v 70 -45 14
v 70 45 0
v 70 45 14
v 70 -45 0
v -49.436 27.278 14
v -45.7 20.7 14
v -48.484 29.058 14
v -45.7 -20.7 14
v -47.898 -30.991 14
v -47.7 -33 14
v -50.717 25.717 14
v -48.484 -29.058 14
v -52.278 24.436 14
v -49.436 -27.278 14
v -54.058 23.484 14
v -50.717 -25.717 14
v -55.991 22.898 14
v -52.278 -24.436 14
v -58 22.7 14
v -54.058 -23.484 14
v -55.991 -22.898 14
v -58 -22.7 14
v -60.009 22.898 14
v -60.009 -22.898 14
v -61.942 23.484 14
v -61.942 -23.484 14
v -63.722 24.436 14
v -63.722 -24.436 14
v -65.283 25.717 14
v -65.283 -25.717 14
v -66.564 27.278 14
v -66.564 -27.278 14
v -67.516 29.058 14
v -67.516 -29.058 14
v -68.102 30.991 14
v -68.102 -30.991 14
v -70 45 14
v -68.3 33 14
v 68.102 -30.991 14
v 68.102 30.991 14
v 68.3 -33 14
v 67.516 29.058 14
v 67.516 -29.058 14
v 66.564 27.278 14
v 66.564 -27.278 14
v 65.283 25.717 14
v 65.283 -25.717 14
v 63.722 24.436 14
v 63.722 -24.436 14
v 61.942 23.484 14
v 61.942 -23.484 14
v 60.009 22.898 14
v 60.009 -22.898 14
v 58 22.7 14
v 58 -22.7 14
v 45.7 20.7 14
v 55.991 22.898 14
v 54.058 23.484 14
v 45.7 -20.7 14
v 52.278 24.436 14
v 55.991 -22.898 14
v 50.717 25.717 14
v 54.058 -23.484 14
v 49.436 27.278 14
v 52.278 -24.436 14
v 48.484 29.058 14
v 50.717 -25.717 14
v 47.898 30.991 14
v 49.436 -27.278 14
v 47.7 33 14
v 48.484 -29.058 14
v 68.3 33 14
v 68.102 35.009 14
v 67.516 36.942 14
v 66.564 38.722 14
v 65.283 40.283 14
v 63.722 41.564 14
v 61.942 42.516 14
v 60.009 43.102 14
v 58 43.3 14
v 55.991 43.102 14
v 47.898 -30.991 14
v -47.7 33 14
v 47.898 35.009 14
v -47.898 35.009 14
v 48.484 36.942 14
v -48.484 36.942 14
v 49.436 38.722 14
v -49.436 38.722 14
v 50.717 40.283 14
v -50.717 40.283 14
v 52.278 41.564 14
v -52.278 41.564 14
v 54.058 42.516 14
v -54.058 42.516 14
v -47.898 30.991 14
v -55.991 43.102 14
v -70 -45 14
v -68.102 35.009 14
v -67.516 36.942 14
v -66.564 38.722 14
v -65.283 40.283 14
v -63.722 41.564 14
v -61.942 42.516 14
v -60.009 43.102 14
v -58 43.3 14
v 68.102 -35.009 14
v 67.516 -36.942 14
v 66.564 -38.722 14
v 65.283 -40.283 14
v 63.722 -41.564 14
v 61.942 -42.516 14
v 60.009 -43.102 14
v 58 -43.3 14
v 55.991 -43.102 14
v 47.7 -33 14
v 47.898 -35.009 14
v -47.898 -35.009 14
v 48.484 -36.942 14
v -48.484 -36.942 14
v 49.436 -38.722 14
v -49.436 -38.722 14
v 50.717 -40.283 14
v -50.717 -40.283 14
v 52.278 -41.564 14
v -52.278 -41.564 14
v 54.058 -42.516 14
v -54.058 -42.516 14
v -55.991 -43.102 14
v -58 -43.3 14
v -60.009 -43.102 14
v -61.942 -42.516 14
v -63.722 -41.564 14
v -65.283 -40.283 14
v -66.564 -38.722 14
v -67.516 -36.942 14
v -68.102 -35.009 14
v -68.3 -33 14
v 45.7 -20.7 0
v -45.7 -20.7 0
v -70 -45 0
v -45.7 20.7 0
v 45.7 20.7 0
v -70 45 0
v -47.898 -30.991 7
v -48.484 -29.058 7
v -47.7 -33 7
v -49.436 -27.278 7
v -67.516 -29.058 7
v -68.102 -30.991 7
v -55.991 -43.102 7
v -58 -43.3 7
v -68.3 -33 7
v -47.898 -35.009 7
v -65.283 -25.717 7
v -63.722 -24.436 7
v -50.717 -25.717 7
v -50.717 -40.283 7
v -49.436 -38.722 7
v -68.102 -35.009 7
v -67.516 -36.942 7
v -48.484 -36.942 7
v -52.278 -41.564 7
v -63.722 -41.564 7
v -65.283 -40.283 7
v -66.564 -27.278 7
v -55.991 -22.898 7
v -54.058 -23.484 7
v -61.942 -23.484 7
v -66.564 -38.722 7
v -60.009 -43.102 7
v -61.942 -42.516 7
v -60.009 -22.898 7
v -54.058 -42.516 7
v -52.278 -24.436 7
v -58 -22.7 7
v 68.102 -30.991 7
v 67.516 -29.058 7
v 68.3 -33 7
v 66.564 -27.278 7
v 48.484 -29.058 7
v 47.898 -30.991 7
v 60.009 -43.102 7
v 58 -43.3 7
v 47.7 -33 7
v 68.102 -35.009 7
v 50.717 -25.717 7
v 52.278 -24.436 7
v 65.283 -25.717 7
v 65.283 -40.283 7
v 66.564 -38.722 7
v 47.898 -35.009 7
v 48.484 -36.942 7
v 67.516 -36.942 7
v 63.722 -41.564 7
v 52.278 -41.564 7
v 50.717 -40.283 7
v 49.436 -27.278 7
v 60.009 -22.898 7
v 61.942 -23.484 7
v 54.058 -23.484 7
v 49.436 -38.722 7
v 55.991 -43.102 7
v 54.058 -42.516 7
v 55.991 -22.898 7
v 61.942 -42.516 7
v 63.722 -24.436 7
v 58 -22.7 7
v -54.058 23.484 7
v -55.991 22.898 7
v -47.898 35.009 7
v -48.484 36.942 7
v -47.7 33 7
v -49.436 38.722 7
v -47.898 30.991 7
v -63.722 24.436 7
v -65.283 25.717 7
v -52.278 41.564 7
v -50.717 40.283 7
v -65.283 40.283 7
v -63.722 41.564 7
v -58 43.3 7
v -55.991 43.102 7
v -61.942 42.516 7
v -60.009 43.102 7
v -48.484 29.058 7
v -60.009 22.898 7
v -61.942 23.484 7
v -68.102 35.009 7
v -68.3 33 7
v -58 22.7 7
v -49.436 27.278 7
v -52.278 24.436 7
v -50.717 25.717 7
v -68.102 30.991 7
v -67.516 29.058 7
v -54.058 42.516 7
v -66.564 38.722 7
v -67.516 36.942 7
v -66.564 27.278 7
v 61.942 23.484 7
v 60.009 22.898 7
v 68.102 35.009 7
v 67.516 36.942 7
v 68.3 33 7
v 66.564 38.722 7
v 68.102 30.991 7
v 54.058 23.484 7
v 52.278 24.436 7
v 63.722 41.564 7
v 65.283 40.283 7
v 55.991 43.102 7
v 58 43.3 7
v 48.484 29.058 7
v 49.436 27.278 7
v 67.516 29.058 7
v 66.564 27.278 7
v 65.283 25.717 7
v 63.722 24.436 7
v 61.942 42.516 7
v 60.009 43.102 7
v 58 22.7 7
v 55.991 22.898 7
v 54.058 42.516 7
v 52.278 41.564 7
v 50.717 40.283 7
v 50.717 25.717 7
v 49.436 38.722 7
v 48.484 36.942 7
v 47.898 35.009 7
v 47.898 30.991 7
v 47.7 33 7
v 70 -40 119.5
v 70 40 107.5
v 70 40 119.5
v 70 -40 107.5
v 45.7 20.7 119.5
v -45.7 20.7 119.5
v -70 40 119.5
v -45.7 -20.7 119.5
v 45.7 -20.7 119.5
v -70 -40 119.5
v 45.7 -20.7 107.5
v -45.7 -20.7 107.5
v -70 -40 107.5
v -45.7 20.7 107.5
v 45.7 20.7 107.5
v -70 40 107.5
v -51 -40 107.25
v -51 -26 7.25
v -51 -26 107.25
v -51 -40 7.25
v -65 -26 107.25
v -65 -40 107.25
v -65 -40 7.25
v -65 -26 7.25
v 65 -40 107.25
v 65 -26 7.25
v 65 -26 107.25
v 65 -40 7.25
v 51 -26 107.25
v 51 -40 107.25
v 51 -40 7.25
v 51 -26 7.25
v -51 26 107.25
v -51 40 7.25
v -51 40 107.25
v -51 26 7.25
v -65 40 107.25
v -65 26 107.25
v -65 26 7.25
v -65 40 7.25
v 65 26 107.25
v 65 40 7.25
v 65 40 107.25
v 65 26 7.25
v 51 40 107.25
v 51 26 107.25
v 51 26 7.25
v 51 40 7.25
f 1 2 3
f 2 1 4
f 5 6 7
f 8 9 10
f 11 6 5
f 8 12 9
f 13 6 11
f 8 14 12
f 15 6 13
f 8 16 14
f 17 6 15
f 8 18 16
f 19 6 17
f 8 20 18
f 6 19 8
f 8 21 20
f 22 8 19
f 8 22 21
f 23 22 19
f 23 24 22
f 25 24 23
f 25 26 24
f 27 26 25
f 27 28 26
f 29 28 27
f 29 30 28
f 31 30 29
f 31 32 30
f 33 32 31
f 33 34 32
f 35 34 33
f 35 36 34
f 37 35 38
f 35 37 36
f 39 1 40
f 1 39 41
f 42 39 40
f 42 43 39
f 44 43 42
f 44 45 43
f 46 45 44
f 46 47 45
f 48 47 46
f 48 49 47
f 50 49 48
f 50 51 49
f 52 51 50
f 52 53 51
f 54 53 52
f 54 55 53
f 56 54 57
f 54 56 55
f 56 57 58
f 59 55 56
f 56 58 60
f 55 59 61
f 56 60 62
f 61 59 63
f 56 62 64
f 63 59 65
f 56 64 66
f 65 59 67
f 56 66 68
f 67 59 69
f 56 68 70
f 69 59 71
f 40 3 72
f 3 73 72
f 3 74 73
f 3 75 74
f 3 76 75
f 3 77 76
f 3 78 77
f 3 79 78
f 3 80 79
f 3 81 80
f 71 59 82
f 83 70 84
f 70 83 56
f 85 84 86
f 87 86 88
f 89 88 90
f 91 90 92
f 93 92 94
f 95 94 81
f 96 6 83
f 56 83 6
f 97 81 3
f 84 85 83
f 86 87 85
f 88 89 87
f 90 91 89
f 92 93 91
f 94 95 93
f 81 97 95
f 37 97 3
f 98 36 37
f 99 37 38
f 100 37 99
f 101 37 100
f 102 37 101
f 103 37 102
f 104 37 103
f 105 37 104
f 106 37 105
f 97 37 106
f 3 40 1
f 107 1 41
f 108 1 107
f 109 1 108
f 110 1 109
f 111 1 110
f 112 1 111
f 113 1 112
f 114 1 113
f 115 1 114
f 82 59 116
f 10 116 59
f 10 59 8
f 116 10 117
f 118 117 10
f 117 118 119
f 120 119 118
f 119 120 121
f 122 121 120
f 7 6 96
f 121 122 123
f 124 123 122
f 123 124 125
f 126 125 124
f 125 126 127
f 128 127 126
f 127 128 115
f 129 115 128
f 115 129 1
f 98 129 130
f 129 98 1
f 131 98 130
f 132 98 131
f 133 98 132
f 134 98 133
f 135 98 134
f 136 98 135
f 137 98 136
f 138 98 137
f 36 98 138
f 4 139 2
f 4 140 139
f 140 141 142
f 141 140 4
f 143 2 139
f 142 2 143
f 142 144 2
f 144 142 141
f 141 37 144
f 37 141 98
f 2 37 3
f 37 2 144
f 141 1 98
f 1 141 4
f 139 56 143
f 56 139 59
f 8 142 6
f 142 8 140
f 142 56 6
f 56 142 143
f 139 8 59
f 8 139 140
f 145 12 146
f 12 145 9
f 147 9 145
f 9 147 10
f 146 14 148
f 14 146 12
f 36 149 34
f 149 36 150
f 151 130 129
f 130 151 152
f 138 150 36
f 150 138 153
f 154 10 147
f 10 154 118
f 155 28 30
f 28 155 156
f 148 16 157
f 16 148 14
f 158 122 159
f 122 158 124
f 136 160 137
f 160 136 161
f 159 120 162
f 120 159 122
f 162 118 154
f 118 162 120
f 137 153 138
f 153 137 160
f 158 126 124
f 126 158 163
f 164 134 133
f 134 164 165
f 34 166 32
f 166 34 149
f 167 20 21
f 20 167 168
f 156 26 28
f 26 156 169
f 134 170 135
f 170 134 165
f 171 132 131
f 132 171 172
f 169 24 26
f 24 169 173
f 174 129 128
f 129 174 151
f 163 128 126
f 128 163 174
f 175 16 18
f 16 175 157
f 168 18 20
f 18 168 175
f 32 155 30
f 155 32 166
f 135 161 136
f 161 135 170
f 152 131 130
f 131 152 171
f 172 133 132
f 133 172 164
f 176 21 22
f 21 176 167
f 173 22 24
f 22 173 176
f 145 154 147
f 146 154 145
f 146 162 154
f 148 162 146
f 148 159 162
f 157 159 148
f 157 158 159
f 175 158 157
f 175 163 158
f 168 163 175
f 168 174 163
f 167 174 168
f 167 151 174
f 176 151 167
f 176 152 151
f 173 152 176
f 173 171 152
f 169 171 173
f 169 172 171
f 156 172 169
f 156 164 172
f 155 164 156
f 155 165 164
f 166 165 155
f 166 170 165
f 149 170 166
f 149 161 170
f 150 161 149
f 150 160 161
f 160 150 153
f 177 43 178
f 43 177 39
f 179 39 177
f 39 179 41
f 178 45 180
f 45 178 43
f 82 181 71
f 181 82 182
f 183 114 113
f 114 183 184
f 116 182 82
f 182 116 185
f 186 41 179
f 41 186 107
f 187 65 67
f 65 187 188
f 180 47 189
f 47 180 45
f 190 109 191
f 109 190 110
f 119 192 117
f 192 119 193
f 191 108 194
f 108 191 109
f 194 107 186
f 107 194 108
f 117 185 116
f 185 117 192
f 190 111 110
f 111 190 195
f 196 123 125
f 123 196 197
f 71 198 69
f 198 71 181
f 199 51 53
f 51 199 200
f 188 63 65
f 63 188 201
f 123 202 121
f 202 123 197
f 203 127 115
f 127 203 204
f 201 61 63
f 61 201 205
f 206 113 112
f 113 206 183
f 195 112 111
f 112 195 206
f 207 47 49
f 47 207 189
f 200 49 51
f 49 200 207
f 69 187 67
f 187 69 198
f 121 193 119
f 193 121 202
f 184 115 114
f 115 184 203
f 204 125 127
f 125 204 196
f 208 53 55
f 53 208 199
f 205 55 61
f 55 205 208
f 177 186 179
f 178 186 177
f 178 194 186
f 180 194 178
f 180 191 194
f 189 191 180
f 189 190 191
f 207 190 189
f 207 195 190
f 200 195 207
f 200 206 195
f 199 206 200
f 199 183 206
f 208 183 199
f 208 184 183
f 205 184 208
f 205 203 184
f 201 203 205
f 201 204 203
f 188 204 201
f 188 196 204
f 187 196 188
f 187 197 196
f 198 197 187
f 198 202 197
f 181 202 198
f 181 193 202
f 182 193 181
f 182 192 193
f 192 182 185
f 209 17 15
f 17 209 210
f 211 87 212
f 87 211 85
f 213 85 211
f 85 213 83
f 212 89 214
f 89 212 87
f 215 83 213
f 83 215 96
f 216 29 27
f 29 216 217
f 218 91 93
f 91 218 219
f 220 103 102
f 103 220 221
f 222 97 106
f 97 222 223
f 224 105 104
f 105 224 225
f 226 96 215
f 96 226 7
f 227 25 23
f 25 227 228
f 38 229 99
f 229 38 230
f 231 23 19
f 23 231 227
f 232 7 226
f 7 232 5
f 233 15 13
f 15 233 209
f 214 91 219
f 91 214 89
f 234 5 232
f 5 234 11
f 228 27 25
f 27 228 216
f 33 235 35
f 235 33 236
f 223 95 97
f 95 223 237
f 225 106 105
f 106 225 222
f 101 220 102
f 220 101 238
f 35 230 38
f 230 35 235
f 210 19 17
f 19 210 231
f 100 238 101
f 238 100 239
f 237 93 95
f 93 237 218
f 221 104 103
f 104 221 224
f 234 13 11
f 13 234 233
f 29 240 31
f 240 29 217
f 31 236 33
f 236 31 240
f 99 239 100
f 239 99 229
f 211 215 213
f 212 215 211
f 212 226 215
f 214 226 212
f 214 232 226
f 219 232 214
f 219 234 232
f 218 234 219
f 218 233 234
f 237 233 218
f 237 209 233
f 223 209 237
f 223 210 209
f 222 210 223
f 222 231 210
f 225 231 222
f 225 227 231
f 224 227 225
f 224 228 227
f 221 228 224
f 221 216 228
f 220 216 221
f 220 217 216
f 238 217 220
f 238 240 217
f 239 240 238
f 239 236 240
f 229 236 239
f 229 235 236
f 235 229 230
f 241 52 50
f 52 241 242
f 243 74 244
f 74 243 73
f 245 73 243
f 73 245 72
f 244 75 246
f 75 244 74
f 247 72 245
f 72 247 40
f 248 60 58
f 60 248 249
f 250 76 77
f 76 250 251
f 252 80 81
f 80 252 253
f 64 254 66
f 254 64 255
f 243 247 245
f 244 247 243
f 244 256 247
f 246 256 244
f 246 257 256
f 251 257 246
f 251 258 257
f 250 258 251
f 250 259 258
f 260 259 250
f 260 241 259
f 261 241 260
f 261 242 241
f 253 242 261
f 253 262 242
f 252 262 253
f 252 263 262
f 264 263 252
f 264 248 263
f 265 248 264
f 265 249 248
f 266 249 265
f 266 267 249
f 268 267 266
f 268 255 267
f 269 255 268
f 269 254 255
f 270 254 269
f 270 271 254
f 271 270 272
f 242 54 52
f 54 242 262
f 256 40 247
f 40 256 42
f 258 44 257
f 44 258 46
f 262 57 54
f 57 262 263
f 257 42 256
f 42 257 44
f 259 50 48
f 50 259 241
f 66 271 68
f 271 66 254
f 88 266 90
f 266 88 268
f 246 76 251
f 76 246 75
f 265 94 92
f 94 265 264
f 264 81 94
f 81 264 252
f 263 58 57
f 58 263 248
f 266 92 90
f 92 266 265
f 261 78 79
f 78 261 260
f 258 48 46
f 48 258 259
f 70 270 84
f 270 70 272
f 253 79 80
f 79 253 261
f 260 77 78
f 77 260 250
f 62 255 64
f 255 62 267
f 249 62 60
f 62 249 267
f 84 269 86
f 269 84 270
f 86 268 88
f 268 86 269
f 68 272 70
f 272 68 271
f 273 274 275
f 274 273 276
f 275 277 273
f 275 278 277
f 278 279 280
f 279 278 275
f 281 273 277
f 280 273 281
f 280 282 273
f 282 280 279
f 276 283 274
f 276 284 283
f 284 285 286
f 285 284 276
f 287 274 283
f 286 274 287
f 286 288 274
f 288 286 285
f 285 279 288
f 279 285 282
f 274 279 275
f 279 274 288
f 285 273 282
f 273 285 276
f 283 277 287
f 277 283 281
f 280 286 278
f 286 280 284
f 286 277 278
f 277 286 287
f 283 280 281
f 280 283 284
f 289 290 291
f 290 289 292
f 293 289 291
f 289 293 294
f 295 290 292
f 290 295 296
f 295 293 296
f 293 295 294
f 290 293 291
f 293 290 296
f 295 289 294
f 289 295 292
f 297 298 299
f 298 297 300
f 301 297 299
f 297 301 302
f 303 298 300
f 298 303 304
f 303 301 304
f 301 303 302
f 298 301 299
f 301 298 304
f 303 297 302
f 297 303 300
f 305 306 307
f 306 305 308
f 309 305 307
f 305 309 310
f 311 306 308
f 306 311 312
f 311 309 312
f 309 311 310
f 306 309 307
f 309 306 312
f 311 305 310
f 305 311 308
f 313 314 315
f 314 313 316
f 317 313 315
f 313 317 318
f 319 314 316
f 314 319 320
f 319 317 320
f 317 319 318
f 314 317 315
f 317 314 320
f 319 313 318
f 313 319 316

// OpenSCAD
$fn = 32;

// ------------------------------------------------------------------------
// Frame cube: base 140 x 90 mm, posts 100 mm tall
// Every part is its own module, assembly() places every instance.
// ------------------------------------------------------------------------

// --- part 1 ---
module base_frame() {
  difference() {
    translate([-70, -45, 0]) cube([140, 90, 14]);
    translate([-45.7, -20.7, -1]) cube([91.4, 41.4, 16]);
    translate([-58, -33, 7]) cylinder(h = 8, d = 20.6);
    translate([58, -33, 7]) cylinder(h = 8, d = 20.6);
    translate([-58, 33, 7]) cylinder(h = 8, d = 20.6);
    translate([58, 33, 7]) cylinder(h = 8, d = 20.6);
  }
}

// --- part 2 ---
module corner_post() {
  translate([-7, -7, 0]) cube([14, 14, 100]);
}

// --- part 3 ---
module top_frame() {
  difference() {
    translate([-70, -40, 0]) cube([140, 80, 12]);
    translate([-45.7, -20.7, -1]) cube([91.4, 41.4, 14]);
  }
}

// --- assembly ---
module assembly() {
  color([0.80, 0.24, 0.20]) translate([0, 0, 0]) rotate([0, 0, 0]) base_frame();
  color([0.20, 0.45, 0.75]) translate([-58, -33, 7.25]) rotate([0, 0, 0]) corner_post();
  color([0.25, 0.62, 0.32]) translate([58, -33, 7.25]) rotate([0, 0, 0]) corner_post();
  color([0.92, 0.70, 0.18]) translate([-58, 33, 7.25]) rotate([0, 0, 0]) corner_post();
  color([0.58, 0.35, 0.70]) translate([58, 33, 7.25]) rotate([0, 0, 0]) corner_post();
  color([0.16, 0.66, 0.66]) translate([0, 0, 107.5]) rotate([0, 0, 0]) top_frame();
}

assembly();
